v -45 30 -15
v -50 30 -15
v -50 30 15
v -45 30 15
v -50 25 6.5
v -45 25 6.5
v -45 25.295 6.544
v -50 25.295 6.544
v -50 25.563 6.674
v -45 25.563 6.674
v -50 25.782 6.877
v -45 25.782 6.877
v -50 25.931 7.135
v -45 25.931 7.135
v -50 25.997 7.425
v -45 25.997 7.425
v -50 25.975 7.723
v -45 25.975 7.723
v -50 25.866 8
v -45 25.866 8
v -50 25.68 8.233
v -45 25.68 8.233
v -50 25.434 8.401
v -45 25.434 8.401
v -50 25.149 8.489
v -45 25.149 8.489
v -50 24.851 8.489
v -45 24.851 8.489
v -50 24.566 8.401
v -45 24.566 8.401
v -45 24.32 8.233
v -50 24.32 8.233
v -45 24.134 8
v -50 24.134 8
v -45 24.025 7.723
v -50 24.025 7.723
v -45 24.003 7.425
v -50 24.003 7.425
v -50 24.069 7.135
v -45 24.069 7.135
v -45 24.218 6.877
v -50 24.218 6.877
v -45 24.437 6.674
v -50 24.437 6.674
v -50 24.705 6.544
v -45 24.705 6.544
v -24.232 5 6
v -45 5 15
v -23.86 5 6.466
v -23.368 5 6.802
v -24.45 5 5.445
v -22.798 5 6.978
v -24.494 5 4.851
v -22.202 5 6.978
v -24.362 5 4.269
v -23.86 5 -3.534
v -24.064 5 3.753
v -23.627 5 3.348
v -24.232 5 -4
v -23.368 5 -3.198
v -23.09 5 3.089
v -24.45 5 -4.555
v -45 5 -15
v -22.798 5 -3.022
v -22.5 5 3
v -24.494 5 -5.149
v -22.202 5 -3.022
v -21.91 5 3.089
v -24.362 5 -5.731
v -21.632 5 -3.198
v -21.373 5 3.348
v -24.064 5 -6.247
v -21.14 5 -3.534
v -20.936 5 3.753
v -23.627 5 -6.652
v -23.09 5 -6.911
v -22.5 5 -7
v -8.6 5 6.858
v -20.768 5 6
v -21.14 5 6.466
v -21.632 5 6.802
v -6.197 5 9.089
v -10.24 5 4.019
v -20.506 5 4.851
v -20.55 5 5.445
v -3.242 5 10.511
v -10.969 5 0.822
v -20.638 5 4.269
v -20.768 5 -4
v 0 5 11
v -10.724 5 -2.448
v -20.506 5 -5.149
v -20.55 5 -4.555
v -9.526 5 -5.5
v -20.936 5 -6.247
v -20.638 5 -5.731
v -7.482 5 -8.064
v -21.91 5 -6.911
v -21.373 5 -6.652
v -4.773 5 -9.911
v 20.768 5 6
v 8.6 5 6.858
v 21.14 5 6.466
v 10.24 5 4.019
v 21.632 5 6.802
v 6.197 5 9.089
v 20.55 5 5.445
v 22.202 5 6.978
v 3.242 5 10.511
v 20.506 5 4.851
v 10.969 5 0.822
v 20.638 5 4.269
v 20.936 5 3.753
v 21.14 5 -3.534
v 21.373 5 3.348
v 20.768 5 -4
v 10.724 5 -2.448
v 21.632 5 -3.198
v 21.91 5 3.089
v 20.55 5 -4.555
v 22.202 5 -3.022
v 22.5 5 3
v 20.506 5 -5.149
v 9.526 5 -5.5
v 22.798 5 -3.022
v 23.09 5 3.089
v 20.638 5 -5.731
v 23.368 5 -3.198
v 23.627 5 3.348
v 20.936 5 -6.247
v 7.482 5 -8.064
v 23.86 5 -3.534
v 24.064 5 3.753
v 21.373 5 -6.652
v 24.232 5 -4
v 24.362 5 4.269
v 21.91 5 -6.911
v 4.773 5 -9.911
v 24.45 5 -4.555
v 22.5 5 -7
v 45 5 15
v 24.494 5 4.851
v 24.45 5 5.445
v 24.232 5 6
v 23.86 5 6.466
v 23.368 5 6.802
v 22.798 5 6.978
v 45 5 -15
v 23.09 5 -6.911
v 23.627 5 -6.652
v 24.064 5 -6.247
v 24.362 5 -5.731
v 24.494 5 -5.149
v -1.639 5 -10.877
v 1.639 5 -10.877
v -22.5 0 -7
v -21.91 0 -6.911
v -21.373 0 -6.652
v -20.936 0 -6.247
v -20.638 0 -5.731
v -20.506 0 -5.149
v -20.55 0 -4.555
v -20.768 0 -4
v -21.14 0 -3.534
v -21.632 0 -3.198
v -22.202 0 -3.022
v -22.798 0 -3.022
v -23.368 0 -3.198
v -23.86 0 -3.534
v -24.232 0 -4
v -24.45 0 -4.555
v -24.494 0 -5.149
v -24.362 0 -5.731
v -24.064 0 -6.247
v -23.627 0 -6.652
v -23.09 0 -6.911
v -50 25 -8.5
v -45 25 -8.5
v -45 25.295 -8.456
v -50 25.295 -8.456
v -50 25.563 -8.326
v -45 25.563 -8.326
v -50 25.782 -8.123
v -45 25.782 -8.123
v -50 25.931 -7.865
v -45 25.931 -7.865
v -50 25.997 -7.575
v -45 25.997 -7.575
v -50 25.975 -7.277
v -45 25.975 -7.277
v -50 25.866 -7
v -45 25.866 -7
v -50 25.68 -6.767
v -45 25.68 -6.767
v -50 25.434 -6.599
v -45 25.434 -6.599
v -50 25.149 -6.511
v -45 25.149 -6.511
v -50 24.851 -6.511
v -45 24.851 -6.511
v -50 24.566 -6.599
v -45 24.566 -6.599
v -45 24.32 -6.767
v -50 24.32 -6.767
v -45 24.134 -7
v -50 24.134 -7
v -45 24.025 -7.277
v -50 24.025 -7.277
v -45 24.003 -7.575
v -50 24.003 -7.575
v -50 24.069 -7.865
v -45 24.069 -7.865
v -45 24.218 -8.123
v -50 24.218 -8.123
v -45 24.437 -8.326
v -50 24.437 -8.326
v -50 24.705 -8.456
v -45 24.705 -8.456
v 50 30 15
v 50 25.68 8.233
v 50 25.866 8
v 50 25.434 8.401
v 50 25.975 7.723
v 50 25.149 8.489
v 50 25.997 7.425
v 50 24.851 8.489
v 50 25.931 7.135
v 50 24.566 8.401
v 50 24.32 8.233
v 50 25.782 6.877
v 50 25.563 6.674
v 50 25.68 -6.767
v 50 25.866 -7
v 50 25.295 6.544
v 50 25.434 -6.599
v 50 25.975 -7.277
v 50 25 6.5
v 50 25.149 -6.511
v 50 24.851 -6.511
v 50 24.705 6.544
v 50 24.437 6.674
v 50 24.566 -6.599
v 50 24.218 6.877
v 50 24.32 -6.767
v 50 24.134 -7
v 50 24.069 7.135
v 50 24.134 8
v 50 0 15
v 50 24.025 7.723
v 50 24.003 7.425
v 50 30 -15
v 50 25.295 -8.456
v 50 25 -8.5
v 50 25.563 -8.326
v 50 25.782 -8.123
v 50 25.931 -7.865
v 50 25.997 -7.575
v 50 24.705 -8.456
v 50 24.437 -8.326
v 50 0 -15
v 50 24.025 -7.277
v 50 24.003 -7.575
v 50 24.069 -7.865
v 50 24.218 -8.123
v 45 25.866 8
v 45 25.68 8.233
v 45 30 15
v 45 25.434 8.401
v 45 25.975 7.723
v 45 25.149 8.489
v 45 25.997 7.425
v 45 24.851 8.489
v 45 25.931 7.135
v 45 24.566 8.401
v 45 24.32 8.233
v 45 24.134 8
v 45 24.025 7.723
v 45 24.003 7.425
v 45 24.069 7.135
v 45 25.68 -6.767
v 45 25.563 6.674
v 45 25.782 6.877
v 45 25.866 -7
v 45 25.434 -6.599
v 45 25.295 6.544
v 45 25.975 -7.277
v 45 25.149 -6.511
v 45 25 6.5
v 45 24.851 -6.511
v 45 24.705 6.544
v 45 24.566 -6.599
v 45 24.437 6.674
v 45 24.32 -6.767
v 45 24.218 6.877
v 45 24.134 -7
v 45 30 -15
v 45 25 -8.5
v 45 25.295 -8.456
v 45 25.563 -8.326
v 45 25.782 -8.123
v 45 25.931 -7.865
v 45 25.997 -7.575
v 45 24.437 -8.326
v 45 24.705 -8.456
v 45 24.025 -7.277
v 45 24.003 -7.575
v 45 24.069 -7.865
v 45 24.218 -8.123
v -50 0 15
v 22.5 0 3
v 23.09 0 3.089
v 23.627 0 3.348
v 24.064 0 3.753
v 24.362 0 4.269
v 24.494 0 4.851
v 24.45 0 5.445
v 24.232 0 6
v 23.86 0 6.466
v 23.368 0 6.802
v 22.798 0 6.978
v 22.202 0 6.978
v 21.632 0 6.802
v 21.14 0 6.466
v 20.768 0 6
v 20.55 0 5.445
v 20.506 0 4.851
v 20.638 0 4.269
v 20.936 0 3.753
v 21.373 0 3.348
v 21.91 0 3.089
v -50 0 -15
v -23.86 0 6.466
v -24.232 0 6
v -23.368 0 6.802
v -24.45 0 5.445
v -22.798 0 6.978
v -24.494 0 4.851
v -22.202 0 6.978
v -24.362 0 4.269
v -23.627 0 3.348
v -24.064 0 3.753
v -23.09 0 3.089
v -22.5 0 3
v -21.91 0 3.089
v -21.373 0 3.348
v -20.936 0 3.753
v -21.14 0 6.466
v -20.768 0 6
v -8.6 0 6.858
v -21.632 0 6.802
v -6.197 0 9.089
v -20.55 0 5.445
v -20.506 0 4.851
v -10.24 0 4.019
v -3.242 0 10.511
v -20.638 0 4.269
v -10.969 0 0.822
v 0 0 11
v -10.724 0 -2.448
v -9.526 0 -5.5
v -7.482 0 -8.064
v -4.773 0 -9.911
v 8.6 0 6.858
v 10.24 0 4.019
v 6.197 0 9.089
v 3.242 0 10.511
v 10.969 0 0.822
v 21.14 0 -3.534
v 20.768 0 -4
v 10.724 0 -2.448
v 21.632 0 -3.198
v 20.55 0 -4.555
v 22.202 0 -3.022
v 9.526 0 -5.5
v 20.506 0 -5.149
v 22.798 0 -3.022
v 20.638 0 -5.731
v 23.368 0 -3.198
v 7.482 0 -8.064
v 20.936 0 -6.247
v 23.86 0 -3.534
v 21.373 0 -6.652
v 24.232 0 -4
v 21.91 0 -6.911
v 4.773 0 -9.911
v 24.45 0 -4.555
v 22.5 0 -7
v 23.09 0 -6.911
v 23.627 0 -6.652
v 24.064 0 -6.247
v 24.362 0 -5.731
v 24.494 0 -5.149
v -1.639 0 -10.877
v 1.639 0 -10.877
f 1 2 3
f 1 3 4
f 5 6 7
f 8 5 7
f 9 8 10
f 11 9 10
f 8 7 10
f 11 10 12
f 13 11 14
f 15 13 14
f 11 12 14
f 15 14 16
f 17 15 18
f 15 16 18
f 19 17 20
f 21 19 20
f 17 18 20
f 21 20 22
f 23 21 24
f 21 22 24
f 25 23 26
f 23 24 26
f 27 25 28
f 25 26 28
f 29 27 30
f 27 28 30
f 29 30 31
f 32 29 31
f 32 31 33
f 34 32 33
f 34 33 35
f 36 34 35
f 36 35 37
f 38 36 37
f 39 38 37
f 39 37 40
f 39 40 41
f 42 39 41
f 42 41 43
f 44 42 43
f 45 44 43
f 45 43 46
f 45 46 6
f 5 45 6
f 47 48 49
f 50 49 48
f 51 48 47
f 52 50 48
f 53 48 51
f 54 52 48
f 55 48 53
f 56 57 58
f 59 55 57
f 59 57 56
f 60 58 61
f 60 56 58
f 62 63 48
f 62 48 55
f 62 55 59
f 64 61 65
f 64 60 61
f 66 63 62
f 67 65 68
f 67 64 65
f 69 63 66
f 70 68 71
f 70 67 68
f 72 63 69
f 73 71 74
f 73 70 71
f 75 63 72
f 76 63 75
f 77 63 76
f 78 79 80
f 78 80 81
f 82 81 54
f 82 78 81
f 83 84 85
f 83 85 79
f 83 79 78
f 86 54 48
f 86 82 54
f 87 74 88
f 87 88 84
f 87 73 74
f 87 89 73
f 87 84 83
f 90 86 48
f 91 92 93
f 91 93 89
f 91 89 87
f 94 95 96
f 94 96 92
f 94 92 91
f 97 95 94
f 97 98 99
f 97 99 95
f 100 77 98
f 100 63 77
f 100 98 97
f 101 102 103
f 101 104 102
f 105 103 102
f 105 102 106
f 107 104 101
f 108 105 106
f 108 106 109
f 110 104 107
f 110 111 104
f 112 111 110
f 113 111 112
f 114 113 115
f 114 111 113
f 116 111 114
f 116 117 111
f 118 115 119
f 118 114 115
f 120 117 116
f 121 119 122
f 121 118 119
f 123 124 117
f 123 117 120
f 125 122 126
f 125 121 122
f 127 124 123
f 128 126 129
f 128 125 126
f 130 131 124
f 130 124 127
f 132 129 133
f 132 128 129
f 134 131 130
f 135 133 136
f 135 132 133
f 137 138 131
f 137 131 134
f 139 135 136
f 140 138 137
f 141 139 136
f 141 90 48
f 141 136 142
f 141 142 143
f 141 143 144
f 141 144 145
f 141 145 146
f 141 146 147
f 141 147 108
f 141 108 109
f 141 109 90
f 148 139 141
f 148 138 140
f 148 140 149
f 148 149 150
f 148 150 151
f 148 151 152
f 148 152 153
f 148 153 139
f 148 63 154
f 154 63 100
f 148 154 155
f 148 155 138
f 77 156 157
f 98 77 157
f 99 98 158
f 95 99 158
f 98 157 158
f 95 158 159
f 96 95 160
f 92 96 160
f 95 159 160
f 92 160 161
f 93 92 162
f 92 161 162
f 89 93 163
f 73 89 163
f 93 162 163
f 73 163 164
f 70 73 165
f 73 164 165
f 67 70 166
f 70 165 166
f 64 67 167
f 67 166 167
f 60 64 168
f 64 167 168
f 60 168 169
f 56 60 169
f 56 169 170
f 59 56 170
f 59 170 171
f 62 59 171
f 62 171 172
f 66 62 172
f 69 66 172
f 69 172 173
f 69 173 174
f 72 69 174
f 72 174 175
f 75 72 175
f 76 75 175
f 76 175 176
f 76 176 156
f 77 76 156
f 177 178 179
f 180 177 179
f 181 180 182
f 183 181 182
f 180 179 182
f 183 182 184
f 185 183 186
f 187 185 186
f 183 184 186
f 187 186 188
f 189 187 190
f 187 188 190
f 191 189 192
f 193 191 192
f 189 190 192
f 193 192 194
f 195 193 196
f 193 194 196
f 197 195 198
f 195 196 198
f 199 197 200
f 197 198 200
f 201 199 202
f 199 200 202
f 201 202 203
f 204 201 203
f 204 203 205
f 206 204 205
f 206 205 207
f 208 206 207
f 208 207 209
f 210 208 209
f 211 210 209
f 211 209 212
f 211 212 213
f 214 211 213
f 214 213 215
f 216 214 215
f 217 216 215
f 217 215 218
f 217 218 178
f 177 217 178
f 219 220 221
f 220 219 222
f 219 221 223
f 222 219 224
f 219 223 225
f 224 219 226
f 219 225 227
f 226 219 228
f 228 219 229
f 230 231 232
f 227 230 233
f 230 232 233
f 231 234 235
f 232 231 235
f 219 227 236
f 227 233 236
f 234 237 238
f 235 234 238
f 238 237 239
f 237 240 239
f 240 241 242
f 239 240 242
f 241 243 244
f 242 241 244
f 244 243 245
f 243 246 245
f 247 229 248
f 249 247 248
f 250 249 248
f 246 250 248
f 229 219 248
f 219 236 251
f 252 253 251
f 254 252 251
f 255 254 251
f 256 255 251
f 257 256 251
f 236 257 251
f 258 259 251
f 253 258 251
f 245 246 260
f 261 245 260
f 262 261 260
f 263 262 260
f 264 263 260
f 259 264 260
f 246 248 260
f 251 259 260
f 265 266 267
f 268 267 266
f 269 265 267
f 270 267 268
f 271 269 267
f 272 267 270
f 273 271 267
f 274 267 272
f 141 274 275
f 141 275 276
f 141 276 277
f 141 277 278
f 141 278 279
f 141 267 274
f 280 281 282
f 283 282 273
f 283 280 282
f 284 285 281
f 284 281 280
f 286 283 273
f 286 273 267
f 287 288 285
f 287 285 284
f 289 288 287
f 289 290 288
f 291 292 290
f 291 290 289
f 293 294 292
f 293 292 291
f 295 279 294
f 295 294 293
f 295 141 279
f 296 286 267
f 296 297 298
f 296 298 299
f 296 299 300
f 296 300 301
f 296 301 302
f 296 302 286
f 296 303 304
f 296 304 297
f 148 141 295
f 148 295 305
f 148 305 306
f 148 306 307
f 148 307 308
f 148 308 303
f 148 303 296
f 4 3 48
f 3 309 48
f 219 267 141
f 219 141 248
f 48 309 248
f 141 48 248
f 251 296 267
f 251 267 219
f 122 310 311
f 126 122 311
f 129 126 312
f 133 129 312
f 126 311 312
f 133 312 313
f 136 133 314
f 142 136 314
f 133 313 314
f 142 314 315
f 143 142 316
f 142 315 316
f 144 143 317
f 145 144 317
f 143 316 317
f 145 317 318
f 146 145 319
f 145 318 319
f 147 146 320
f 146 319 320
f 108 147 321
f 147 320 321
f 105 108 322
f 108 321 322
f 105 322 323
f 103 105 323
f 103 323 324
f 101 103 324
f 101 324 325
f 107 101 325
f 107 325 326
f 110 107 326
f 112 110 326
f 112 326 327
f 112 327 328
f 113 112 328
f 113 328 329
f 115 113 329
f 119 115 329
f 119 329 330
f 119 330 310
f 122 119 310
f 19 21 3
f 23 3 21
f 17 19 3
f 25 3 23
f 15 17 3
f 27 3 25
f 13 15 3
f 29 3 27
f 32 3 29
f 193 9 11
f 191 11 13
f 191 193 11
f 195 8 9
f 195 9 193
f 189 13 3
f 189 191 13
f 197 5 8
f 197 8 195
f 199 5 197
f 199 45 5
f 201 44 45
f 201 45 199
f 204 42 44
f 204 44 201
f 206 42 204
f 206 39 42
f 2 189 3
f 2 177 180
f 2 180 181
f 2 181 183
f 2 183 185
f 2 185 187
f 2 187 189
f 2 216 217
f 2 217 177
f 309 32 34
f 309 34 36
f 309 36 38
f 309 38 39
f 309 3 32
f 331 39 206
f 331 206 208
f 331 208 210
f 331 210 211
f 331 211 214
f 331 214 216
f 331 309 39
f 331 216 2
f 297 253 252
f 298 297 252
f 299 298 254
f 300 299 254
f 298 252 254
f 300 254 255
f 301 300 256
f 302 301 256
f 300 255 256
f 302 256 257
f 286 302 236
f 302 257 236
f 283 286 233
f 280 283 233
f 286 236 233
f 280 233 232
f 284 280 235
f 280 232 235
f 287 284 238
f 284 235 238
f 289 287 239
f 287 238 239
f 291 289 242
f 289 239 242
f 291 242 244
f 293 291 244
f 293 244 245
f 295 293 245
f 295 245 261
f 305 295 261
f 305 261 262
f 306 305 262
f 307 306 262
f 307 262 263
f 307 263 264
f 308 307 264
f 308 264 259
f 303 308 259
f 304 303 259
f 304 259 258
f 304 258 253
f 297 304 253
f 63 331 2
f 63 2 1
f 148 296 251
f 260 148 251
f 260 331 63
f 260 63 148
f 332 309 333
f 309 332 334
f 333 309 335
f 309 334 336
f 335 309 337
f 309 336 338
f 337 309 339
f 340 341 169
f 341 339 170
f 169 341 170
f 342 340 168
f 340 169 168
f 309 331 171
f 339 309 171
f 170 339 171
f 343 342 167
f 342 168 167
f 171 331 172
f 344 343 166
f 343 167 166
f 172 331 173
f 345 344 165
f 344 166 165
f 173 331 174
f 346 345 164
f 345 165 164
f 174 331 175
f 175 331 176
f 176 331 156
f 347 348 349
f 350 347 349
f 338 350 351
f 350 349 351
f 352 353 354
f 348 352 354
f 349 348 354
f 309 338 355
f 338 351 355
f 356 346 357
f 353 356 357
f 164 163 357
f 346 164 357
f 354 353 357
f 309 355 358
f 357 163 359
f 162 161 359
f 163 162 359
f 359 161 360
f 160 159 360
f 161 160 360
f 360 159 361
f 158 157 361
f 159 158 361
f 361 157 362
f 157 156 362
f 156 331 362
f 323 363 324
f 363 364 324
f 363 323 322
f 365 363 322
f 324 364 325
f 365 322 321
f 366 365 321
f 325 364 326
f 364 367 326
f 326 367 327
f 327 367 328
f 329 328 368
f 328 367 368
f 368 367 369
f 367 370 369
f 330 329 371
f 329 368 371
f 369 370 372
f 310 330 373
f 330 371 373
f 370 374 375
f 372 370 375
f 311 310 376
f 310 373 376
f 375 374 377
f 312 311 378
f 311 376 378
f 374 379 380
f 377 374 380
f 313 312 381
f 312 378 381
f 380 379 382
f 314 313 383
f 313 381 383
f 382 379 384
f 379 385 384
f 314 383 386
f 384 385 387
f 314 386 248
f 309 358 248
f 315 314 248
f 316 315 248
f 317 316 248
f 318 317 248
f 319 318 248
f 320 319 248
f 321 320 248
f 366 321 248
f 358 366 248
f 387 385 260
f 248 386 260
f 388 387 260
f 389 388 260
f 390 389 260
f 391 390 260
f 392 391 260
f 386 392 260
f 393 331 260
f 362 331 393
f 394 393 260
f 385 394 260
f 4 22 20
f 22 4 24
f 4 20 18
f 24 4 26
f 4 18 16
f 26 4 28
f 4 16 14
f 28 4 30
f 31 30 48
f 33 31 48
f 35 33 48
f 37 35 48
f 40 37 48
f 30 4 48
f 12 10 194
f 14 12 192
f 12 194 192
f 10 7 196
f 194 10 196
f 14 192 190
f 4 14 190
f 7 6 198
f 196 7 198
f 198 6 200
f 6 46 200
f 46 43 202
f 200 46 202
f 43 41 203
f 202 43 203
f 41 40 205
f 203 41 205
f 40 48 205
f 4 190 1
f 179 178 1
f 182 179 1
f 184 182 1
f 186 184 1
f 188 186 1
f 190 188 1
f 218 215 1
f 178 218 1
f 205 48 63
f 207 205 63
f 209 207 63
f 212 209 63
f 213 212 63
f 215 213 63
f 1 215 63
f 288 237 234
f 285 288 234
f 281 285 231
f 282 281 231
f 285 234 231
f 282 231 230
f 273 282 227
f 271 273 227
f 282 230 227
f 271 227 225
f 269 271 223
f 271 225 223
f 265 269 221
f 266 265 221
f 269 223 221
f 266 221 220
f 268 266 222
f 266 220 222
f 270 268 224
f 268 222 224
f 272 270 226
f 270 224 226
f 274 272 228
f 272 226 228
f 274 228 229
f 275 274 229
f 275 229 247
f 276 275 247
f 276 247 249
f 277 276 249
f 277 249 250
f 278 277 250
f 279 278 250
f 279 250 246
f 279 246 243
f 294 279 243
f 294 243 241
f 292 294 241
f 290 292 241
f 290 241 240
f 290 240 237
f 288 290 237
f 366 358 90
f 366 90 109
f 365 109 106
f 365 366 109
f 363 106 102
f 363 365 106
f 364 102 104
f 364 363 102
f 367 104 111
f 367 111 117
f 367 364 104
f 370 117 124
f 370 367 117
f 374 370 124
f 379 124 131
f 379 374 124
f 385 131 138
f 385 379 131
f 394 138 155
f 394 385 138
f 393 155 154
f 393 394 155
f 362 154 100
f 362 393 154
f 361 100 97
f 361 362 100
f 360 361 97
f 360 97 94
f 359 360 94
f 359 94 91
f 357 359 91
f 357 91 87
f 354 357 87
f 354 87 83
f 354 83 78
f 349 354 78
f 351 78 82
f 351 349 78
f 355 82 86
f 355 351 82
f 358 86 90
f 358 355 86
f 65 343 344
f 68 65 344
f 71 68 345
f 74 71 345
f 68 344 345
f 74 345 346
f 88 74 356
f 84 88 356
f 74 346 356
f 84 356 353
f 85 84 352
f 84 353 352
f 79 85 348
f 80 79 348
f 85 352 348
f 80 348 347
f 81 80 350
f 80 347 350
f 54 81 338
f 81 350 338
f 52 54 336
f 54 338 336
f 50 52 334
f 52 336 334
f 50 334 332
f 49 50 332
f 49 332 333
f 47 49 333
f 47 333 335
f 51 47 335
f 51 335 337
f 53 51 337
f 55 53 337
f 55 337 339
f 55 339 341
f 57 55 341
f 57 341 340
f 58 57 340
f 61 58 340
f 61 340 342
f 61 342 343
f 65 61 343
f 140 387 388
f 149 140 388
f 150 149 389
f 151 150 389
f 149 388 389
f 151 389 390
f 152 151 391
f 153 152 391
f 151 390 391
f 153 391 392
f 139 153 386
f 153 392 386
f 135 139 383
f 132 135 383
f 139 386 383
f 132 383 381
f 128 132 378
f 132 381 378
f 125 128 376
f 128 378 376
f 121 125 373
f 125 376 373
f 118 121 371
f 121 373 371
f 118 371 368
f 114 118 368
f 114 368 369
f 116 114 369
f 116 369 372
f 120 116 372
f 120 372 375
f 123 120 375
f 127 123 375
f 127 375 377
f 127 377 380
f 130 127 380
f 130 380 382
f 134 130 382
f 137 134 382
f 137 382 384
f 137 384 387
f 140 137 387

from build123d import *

# Parameters (mm, degrees)
SKETCH2_W           = 100
SKETCH2_H           = 30
SKETCH2_R           = 11
BOSS_EXTRUDE1_DEPTH = 5
SKETCH3_W           = 5
SKETCH3_H           = 30
BOSS_EXTRUDE2_DEPTH = 25
SKETCH4_R           = 1
CUT_EXTRUDE1_DEPTH  = 106.475115549
SKETCH5_R           = 2
CUT_EXTRUDE2_DEPTH  = 10


with BuildPart() as part:
    # Sketch2 → Boss-Extrude1 (new body)
    with BuildSketch(Plane(origin=(0, 0, 0), x_dir=(1, 0, 0), z_dir=(0, 1, 0))):
        Rectangle(SKETCH2_W, SKETCH2_H)
        with Locations(Location((0, 0, 0), (0, 0, 270))):
            Circle(SKETCH2_R, mode=Mode.SUBTRACT)
    extrude(amount=BOSS_EXTRUDE1_DEPTH)

    # Sketch3 → Boss-Extrude2 (add)
    with BuildSketch(Plane(origin=(0, 5, 0), x_dir=(1, 0, 0), z_dir=(0, 1, 0))):
        with Locations((-47.5, 0)):
            Rectangle(SKETCH3_W, SKETCH3_H)
        with Locations((47.5, 0)):
            Rectangle(SKETCH3_W, SKETCH3_H)
    extrude(amount=BOSS_EXTRUDE2_DEPTH)

    # Sketch4 → Cut-Extrude1 (cut, through all)
    with BuildSketch(Plane(origin=(50, 0, 0), x_dir=(0, 0, -1), z_dir=(1, 0, 0))):
        with Locations((-7.5, 25)):
            Circle(SKETCH4_R)
        with Locations((7.5, 25)):
            Circle(SKETCH4_R)
    extrude(amount=-CUT_EXTRUDE1_DEPTH, mode=Mode.SUBTRACT)

    # Sketch5 → Cut-Extrude2 (cut)
    with BuildSketch(Plane.XZ):
        with Locations(Location((-22.5, -5, 0), (0, 0, 270))):
            Circle(SKETCH5_R)
        with Locations(Location((22.5, -5, 0), (0, 0, 270))):
            Circle(SKETCH5_R)
        with Locations(Location((-22.5, 5, 0), (0, 0, 270))):
            Circle(SKETCH5_R)
        with Locations(Location((22.5, 5, 0), (0, 0, 270))):
            Circle(SKETCH5_R)
    extrude(amount=-CUT_EXTRUDE2_DEPTH, mode=Mode.SUBTRACT)


solid = part.part
